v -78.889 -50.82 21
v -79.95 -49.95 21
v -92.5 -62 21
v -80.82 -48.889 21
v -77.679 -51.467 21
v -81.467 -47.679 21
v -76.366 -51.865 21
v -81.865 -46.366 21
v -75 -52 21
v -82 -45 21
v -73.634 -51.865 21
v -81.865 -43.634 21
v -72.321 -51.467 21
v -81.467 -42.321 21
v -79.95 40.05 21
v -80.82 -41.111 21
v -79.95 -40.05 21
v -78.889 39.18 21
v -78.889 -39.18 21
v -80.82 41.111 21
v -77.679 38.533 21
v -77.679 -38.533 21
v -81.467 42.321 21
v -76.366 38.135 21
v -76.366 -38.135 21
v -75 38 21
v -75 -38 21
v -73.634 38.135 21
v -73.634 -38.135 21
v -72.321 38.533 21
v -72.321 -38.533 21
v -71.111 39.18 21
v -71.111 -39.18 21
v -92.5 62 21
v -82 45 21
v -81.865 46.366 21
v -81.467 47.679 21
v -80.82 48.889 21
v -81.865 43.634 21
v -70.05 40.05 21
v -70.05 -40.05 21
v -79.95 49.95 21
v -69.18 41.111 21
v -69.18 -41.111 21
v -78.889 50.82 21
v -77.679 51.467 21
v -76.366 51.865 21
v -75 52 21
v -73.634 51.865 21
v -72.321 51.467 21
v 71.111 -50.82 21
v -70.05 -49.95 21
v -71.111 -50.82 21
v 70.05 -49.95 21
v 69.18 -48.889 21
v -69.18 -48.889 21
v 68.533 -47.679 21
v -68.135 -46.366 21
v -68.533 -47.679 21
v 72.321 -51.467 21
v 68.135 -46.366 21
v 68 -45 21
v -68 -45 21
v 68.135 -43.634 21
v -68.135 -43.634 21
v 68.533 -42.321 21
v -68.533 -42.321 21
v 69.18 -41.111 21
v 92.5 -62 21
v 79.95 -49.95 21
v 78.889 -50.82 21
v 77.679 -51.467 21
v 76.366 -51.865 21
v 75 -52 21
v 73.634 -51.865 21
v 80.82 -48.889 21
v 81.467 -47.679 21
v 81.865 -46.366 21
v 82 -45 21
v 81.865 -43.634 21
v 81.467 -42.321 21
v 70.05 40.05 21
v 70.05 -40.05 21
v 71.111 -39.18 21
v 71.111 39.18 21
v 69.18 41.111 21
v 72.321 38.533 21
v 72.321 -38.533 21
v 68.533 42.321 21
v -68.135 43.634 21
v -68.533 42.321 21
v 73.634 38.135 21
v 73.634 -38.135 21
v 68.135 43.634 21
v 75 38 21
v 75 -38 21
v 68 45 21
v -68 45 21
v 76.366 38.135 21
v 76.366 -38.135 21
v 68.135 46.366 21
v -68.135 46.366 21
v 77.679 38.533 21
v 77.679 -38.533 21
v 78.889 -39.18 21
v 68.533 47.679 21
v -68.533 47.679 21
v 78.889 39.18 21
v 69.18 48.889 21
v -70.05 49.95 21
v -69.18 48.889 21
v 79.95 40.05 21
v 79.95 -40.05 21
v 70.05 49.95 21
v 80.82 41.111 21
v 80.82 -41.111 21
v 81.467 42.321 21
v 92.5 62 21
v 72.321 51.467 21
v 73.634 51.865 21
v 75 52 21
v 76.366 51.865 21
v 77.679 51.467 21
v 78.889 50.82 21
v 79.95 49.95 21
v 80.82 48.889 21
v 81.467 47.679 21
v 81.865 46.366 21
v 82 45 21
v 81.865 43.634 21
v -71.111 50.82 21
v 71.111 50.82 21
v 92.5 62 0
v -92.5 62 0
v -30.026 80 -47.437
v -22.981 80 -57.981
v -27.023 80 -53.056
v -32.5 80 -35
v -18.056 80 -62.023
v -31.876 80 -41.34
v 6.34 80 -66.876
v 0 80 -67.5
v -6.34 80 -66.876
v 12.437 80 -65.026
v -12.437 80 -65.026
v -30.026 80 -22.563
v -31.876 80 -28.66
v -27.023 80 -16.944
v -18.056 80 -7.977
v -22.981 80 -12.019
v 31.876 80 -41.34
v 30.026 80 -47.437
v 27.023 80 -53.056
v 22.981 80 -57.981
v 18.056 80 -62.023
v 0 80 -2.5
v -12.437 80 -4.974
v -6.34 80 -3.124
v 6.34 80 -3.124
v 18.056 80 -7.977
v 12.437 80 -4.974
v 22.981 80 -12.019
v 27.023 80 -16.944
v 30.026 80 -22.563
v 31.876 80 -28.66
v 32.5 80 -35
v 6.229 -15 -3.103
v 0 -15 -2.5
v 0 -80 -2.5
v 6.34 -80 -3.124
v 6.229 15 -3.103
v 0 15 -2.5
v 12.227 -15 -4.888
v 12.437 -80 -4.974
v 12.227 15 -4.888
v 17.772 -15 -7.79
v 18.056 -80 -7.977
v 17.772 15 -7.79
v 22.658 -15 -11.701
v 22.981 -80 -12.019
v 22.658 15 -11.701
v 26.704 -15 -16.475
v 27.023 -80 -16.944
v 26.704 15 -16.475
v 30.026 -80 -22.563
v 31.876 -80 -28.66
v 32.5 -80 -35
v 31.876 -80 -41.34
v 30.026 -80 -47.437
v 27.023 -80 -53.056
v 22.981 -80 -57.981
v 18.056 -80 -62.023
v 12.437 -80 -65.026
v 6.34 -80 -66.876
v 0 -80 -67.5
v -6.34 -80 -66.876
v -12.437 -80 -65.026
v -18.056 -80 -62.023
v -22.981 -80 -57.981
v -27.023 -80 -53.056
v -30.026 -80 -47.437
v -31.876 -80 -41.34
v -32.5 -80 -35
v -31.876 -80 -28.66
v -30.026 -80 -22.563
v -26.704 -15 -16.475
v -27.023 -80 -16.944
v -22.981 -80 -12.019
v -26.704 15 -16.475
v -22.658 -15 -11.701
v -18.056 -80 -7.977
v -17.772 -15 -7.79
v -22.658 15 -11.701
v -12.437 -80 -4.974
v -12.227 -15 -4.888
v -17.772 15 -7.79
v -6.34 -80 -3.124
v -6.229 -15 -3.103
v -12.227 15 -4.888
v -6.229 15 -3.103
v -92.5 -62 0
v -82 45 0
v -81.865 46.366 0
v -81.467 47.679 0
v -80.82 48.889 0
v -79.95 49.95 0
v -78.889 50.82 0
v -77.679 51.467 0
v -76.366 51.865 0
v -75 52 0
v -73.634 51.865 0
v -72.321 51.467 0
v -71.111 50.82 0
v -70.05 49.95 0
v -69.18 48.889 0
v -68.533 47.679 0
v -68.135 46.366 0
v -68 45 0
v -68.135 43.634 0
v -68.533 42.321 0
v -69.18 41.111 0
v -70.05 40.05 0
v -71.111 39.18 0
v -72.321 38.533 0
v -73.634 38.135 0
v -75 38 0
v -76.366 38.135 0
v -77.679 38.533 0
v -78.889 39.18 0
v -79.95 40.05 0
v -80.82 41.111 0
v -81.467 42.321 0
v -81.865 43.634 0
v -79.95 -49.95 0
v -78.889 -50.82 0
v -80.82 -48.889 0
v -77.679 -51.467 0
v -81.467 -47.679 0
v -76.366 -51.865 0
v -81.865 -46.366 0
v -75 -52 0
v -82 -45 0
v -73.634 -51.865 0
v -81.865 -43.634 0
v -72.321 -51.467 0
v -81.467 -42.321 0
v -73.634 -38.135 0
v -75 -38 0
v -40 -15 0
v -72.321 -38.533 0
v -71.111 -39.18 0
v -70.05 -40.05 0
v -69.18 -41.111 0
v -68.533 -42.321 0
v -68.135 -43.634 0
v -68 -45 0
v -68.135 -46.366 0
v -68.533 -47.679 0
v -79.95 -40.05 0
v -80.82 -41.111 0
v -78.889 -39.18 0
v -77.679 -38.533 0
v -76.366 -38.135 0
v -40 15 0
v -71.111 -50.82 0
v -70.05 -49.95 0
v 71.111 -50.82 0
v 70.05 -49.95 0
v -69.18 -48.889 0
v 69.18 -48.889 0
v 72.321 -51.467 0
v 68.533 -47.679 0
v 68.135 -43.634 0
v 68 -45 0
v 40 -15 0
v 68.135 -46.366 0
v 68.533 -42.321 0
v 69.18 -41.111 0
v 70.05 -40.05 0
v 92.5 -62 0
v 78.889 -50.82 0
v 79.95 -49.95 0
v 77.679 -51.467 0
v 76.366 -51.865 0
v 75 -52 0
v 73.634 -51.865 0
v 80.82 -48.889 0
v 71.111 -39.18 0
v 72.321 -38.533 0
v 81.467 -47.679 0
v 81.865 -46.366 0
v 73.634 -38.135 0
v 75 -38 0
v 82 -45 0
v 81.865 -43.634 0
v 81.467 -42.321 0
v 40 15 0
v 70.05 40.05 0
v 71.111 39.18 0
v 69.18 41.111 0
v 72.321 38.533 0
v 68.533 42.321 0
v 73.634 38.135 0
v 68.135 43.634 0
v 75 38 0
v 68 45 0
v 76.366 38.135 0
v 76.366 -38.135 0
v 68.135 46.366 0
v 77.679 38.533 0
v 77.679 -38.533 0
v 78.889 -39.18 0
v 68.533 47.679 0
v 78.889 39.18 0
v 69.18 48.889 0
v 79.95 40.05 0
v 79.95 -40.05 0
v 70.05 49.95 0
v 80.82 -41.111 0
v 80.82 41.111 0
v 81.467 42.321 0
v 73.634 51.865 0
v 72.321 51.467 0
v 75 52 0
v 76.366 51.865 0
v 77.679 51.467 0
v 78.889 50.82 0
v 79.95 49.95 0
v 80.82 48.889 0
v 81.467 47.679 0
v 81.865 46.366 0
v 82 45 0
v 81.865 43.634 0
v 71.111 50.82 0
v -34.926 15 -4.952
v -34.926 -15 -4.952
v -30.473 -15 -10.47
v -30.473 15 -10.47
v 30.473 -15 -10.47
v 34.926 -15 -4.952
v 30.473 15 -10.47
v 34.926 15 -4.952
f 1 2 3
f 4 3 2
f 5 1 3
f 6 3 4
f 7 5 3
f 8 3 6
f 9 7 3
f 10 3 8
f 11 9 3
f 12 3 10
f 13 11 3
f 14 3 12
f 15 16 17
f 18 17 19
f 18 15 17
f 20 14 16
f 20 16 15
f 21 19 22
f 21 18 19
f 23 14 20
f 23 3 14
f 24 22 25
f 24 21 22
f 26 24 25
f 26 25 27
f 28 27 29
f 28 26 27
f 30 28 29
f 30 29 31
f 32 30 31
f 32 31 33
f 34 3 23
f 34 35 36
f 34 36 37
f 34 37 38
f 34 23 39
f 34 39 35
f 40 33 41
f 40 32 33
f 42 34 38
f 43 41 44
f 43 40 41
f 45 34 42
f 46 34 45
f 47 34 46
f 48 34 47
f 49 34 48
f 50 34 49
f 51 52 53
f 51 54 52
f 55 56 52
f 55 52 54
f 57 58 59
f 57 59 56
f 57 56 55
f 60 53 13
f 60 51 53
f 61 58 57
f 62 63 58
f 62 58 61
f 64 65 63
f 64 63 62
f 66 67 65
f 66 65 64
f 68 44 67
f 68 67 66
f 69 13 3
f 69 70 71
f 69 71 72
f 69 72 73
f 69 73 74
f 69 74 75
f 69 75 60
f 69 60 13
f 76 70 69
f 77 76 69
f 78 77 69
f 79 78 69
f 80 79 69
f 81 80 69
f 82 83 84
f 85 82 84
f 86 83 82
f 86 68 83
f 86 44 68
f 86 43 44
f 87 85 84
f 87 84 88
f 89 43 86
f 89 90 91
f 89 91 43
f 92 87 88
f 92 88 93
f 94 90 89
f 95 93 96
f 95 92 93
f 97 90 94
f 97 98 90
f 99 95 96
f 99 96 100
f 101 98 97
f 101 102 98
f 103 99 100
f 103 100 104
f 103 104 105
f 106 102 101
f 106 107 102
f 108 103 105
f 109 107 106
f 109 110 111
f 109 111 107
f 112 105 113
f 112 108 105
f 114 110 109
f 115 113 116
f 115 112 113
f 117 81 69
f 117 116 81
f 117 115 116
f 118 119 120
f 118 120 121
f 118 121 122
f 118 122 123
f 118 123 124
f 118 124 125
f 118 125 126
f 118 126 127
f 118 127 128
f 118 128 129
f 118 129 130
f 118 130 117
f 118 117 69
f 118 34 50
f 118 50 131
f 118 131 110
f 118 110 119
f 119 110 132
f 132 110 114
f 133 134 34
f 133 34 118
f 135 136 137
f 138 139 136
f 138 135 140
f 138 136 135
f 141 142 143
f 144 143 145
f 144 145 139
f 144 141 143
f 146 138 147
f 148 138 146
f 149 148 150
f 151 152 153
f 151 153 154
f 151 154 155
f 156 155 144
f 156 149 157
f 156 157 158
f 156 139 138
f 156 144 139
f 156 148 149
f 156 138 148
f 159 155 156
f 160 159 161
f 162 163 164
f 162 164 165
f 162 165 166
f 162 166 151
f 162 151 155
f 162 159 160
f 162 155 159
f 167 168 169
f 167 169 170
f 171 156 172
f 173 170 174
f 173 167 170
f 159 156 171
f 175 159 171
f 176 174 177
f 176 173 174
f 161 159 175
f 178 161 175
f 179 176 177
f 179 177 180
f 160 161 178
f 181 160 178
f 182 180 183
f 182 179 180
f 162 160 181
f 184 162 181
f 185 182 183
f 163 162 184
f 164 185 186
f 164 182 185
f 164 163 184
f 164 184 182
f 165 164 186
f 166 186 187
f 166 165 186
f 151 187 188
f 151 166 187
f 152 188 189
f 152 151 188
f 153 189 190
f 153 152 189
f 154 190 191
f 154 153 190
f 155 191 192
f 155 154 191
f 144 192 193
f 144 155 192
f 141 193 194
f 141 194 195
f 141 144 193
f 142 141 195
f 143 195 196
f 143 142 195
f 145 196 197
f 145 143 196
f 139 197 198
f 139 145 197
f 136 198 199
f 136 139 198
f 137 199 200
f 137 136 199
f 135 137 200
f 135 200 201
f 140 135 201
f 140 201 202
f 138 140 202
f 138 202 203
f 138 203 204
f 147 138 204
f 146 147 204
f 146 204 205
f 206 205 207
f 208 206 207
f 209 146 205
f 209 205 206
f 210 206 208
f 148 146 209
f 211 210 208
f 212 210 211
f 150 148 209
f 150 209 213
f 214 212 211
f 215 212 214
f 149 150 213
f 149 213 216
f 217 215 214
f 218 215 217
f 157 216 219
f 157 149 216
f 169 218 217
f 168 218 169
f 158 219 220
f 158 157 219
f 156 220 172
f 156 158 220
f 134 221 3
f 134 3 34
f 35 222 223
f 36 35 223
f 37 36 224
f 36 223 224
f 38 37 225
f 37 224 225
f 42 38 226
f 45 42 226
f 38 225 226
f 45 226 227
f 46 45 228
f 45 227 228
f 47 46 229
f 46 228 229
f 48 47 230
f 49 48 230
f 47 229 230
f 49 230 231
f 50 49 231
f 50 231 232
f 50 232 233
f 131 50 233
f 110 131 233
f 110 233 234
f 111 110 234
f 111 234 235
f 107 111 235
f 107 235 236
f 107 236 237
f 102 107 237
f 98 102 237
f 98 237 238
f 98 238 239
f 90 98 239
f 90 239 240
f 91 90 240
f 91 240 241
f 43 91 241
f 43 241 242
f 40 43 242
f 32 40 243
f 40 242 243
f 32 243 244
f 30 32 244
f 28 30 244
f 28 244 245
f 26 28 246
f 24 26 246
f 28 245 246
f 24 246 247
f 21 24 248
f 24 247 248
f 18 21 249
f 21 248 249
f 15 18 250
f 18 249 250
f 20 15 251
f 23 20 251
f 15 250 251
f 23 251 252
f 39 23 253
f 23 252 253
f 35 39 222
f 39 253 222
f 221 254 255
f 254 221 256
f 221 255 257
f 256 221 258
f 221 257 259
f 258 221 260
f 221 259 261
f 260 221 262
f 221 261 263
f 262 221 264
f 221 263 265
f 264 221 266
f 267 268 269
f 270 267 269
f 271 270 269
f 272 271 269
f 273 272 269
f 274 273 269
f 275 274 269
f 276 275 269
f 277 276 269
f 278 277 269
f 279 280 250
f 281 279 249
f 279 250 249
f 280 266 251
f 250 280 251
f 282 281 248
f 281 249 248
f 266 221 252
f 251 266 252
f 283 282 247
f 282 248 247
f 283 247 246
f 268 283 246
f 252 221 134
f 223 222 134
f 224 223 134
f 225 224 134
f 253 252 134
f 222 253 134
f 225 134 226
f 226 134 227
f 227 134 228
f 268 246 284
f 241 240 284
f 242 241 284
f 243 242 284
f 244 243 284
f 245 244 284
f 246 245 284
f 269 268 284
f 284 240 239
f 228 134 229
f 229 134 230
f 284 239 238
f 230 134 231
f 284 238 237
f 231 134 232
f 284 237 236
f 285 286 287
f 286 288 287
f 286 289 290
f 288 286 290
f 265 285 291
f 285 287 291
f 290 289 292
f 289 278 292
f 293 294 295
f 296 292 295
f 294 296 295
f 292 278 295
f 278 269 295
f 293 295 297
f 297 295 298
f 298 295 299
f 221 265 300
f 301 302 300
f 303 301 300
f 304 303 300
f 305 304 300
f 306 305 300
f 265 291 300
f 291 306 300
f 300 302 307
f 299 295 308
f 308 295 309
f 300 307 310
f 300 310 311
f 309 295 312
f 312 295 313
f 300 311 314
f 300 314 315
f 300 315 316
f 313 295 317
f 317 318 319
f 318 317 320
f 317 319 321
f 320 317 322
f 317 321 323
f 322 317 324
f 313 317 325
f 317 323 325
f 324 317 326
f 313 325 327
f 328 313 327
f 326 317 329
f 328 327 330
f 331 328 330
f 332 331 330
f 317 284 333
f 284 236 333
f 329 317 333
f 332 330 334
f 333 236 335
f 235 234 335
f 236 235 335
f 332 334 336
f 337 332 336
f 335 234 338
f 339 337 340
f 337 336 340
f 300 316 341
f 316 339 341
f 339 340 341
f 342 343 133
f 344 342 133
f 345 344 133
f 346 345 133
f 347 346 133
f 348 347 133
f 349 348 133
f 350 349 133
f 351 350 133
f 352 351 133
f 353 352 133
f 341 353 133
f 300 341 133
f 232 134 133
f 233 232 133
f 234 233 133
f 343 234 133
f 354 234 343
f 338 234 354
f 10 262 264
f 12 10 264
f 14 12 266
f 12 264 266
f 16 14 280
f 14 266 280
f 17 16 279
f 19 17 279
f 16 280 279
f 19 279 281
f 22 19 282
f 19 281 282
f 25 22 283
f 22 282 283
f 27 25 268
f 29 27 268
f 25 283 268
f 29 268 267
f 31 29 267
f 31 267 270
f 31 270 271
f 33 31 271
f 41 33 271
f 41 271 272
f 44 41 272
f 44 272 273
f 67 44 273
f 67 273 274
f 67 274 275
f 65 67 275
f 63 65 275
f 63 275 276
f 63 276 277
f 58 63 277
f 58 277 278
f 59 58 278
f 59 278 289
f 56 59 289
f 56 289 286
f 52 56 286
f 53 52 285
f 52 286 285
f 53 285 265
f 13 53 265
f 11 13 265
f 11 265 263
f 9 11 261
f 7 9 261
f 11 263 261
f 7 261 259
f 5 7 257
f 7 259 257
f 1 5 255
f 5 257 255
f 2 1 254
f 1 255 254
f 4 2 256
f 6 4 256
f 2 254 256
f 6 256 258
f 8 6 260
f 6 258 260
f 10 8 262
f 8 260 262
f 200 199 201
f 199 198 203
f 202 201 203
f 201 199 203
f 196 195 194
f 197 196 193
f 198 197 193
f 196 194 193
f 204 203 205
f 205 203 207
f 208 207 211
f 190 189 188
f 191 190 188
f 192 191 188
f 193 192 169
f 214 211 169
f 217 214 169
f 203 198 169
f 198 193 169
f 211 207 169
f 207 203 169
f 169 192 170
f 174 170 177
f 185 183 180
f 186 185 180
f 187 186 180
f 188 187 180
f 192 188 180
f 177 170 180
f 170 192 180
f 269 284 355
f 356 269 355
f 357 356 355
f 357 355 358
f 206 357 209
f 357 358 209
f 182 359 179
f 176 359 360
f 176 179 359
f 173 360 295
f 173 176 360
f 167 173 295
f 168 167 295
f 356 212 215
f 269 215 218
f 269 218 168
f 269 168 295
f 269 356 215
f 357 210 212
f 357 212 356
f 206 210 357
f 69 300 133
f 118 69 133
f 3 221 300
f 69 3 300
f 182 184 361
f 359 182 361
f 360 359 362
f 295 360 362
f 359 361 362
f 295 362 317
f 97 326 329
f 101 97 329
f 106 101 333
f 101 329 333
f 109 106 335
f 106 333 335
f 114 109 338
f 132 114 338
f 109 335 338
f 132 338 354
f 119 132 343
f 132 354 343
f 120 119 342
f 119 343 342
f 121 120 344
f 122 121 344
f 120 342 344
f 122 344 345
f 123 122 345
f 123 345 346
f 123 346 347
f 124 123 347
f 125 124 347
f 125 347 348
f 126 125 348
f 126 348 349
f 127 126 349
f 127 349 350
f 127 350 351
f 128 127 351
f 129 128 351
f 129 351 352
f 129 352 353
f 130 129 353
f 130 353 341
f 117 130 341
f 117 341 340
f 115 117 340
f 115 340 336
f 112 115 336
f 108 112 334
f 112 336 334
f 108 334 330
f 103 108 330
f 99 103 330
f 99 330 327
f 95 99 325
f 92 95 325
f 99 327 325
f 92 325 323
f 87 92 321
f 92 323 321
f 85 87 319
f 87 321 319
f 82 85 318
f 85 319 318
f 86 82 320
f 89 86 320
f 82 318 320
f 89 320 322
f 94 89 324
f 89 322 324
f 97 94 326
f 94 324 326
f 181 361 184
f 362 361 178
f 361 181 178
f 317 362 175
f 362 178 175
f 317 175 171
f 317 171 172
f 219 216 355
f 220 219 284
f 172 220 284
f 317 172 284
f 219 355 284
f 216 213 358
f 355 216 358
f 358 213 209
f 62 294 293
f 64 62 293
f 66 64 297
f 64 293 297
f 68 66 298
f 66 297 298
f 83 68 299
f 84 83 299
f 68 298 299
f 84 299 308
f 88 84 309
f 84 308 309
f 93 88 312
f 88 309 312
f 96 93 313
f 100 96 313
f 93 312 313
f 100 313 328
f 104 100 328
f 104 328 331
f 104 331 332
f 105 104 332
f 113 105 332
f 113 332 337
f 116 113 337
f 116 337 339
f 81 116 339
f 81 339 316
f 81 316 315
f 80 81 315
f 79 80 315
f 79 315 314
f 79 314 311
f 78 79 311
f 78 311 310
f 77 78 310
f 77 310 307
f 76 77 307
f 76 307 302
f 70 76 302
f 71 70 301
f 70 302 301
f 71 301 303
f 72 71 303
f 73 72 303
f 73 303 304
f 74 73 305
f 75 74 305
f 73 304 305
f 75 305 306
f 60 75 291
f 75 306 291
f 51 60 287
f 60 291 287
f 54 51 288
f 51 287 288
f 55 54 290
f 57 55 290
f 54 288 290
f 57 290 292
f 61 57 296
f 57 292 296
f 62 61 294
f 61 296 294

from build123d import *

# Parameters (mm, degrees)
SKETCH_1_W          = 185
SKETCH_1_H          = 124
EXTRUDE_1_DEPTH     = 21
EXTRUDE_2_DEPTH     = 15
SKETCH_5_R          = 32.5
EXTRUDE_3_DEPTH     = 80
SKETCH_6_R          = 7
CUT_EXTRUDE_1_DEPTH = 140.687150447


with BuildPart() as part:
    # 草图1 → 凸台-拉伸1 (new body)
    with BuildSketch(Plane.XY):
        Rectangle(SKETCH_1_W, SKETCH_1_H)
    extrude(amount=EXTRUDE_1_DEPTH)

    # 草图3 → 凸台-拉伸2 (add, symmetric)
    with BuildSketch(Plane(origin=(0, 0, 0), x_dir=(1, 0, 0), z_dir=(0, 1, 0))):
        with BuildLine():
            Line((40, 0), (-40, 0))
            ThreePointArc((-40, 0), (-26.459601843, 16.925451065), (-19.835033499, 37.563483197))
            ThreePointArc((-19.835033499, 37.563483197), (0, 15), (19.835033499, 37.563483197))
            ThreePointArc((19.835033499, 37.563483197), (26.459601843, 16.925451065), (40, 0))
        make_face()
    extrude(amount=EXTRUDE_2_DEPTH, both=True)

    # 草图5 → 凸台-拉伸3 (add, symmetric)
    with BuildSketch(Plane(origin=(0, 0, 0), x_dir=(1, 0, 0), z_dir=(0, 1, 0))):
        with Locations(Location((0, 35, 0), (0, 0, 270))):
            Circle(SKETCH_5_R)
    extrude(amount=EXTRUDE_3_DEPTH, both=True)

    # 草图6 → 切除-拉伸1 (cut, through all)
    with BuildSketch(Plane(origin=(0, 0, 0), x_dir=(-1, 0, 0), z_dir=(0, 0, -1))):
        with Locations((-75, 45)):
            Circle(SKETCH_6_R)
        with Locations((75, 45)):
            Circle(SKETCH_6_R)
        with Locations((75, -45)):
            Circle(SKETCH_6_R)
        with Locations((-75, -45)):
            Circle(SKETCH_6_R)
    extrude(amount=-CUT_EXTRUDE_1_DEPTH, mode=Mode.SUBTRACT)


solid = part.part
